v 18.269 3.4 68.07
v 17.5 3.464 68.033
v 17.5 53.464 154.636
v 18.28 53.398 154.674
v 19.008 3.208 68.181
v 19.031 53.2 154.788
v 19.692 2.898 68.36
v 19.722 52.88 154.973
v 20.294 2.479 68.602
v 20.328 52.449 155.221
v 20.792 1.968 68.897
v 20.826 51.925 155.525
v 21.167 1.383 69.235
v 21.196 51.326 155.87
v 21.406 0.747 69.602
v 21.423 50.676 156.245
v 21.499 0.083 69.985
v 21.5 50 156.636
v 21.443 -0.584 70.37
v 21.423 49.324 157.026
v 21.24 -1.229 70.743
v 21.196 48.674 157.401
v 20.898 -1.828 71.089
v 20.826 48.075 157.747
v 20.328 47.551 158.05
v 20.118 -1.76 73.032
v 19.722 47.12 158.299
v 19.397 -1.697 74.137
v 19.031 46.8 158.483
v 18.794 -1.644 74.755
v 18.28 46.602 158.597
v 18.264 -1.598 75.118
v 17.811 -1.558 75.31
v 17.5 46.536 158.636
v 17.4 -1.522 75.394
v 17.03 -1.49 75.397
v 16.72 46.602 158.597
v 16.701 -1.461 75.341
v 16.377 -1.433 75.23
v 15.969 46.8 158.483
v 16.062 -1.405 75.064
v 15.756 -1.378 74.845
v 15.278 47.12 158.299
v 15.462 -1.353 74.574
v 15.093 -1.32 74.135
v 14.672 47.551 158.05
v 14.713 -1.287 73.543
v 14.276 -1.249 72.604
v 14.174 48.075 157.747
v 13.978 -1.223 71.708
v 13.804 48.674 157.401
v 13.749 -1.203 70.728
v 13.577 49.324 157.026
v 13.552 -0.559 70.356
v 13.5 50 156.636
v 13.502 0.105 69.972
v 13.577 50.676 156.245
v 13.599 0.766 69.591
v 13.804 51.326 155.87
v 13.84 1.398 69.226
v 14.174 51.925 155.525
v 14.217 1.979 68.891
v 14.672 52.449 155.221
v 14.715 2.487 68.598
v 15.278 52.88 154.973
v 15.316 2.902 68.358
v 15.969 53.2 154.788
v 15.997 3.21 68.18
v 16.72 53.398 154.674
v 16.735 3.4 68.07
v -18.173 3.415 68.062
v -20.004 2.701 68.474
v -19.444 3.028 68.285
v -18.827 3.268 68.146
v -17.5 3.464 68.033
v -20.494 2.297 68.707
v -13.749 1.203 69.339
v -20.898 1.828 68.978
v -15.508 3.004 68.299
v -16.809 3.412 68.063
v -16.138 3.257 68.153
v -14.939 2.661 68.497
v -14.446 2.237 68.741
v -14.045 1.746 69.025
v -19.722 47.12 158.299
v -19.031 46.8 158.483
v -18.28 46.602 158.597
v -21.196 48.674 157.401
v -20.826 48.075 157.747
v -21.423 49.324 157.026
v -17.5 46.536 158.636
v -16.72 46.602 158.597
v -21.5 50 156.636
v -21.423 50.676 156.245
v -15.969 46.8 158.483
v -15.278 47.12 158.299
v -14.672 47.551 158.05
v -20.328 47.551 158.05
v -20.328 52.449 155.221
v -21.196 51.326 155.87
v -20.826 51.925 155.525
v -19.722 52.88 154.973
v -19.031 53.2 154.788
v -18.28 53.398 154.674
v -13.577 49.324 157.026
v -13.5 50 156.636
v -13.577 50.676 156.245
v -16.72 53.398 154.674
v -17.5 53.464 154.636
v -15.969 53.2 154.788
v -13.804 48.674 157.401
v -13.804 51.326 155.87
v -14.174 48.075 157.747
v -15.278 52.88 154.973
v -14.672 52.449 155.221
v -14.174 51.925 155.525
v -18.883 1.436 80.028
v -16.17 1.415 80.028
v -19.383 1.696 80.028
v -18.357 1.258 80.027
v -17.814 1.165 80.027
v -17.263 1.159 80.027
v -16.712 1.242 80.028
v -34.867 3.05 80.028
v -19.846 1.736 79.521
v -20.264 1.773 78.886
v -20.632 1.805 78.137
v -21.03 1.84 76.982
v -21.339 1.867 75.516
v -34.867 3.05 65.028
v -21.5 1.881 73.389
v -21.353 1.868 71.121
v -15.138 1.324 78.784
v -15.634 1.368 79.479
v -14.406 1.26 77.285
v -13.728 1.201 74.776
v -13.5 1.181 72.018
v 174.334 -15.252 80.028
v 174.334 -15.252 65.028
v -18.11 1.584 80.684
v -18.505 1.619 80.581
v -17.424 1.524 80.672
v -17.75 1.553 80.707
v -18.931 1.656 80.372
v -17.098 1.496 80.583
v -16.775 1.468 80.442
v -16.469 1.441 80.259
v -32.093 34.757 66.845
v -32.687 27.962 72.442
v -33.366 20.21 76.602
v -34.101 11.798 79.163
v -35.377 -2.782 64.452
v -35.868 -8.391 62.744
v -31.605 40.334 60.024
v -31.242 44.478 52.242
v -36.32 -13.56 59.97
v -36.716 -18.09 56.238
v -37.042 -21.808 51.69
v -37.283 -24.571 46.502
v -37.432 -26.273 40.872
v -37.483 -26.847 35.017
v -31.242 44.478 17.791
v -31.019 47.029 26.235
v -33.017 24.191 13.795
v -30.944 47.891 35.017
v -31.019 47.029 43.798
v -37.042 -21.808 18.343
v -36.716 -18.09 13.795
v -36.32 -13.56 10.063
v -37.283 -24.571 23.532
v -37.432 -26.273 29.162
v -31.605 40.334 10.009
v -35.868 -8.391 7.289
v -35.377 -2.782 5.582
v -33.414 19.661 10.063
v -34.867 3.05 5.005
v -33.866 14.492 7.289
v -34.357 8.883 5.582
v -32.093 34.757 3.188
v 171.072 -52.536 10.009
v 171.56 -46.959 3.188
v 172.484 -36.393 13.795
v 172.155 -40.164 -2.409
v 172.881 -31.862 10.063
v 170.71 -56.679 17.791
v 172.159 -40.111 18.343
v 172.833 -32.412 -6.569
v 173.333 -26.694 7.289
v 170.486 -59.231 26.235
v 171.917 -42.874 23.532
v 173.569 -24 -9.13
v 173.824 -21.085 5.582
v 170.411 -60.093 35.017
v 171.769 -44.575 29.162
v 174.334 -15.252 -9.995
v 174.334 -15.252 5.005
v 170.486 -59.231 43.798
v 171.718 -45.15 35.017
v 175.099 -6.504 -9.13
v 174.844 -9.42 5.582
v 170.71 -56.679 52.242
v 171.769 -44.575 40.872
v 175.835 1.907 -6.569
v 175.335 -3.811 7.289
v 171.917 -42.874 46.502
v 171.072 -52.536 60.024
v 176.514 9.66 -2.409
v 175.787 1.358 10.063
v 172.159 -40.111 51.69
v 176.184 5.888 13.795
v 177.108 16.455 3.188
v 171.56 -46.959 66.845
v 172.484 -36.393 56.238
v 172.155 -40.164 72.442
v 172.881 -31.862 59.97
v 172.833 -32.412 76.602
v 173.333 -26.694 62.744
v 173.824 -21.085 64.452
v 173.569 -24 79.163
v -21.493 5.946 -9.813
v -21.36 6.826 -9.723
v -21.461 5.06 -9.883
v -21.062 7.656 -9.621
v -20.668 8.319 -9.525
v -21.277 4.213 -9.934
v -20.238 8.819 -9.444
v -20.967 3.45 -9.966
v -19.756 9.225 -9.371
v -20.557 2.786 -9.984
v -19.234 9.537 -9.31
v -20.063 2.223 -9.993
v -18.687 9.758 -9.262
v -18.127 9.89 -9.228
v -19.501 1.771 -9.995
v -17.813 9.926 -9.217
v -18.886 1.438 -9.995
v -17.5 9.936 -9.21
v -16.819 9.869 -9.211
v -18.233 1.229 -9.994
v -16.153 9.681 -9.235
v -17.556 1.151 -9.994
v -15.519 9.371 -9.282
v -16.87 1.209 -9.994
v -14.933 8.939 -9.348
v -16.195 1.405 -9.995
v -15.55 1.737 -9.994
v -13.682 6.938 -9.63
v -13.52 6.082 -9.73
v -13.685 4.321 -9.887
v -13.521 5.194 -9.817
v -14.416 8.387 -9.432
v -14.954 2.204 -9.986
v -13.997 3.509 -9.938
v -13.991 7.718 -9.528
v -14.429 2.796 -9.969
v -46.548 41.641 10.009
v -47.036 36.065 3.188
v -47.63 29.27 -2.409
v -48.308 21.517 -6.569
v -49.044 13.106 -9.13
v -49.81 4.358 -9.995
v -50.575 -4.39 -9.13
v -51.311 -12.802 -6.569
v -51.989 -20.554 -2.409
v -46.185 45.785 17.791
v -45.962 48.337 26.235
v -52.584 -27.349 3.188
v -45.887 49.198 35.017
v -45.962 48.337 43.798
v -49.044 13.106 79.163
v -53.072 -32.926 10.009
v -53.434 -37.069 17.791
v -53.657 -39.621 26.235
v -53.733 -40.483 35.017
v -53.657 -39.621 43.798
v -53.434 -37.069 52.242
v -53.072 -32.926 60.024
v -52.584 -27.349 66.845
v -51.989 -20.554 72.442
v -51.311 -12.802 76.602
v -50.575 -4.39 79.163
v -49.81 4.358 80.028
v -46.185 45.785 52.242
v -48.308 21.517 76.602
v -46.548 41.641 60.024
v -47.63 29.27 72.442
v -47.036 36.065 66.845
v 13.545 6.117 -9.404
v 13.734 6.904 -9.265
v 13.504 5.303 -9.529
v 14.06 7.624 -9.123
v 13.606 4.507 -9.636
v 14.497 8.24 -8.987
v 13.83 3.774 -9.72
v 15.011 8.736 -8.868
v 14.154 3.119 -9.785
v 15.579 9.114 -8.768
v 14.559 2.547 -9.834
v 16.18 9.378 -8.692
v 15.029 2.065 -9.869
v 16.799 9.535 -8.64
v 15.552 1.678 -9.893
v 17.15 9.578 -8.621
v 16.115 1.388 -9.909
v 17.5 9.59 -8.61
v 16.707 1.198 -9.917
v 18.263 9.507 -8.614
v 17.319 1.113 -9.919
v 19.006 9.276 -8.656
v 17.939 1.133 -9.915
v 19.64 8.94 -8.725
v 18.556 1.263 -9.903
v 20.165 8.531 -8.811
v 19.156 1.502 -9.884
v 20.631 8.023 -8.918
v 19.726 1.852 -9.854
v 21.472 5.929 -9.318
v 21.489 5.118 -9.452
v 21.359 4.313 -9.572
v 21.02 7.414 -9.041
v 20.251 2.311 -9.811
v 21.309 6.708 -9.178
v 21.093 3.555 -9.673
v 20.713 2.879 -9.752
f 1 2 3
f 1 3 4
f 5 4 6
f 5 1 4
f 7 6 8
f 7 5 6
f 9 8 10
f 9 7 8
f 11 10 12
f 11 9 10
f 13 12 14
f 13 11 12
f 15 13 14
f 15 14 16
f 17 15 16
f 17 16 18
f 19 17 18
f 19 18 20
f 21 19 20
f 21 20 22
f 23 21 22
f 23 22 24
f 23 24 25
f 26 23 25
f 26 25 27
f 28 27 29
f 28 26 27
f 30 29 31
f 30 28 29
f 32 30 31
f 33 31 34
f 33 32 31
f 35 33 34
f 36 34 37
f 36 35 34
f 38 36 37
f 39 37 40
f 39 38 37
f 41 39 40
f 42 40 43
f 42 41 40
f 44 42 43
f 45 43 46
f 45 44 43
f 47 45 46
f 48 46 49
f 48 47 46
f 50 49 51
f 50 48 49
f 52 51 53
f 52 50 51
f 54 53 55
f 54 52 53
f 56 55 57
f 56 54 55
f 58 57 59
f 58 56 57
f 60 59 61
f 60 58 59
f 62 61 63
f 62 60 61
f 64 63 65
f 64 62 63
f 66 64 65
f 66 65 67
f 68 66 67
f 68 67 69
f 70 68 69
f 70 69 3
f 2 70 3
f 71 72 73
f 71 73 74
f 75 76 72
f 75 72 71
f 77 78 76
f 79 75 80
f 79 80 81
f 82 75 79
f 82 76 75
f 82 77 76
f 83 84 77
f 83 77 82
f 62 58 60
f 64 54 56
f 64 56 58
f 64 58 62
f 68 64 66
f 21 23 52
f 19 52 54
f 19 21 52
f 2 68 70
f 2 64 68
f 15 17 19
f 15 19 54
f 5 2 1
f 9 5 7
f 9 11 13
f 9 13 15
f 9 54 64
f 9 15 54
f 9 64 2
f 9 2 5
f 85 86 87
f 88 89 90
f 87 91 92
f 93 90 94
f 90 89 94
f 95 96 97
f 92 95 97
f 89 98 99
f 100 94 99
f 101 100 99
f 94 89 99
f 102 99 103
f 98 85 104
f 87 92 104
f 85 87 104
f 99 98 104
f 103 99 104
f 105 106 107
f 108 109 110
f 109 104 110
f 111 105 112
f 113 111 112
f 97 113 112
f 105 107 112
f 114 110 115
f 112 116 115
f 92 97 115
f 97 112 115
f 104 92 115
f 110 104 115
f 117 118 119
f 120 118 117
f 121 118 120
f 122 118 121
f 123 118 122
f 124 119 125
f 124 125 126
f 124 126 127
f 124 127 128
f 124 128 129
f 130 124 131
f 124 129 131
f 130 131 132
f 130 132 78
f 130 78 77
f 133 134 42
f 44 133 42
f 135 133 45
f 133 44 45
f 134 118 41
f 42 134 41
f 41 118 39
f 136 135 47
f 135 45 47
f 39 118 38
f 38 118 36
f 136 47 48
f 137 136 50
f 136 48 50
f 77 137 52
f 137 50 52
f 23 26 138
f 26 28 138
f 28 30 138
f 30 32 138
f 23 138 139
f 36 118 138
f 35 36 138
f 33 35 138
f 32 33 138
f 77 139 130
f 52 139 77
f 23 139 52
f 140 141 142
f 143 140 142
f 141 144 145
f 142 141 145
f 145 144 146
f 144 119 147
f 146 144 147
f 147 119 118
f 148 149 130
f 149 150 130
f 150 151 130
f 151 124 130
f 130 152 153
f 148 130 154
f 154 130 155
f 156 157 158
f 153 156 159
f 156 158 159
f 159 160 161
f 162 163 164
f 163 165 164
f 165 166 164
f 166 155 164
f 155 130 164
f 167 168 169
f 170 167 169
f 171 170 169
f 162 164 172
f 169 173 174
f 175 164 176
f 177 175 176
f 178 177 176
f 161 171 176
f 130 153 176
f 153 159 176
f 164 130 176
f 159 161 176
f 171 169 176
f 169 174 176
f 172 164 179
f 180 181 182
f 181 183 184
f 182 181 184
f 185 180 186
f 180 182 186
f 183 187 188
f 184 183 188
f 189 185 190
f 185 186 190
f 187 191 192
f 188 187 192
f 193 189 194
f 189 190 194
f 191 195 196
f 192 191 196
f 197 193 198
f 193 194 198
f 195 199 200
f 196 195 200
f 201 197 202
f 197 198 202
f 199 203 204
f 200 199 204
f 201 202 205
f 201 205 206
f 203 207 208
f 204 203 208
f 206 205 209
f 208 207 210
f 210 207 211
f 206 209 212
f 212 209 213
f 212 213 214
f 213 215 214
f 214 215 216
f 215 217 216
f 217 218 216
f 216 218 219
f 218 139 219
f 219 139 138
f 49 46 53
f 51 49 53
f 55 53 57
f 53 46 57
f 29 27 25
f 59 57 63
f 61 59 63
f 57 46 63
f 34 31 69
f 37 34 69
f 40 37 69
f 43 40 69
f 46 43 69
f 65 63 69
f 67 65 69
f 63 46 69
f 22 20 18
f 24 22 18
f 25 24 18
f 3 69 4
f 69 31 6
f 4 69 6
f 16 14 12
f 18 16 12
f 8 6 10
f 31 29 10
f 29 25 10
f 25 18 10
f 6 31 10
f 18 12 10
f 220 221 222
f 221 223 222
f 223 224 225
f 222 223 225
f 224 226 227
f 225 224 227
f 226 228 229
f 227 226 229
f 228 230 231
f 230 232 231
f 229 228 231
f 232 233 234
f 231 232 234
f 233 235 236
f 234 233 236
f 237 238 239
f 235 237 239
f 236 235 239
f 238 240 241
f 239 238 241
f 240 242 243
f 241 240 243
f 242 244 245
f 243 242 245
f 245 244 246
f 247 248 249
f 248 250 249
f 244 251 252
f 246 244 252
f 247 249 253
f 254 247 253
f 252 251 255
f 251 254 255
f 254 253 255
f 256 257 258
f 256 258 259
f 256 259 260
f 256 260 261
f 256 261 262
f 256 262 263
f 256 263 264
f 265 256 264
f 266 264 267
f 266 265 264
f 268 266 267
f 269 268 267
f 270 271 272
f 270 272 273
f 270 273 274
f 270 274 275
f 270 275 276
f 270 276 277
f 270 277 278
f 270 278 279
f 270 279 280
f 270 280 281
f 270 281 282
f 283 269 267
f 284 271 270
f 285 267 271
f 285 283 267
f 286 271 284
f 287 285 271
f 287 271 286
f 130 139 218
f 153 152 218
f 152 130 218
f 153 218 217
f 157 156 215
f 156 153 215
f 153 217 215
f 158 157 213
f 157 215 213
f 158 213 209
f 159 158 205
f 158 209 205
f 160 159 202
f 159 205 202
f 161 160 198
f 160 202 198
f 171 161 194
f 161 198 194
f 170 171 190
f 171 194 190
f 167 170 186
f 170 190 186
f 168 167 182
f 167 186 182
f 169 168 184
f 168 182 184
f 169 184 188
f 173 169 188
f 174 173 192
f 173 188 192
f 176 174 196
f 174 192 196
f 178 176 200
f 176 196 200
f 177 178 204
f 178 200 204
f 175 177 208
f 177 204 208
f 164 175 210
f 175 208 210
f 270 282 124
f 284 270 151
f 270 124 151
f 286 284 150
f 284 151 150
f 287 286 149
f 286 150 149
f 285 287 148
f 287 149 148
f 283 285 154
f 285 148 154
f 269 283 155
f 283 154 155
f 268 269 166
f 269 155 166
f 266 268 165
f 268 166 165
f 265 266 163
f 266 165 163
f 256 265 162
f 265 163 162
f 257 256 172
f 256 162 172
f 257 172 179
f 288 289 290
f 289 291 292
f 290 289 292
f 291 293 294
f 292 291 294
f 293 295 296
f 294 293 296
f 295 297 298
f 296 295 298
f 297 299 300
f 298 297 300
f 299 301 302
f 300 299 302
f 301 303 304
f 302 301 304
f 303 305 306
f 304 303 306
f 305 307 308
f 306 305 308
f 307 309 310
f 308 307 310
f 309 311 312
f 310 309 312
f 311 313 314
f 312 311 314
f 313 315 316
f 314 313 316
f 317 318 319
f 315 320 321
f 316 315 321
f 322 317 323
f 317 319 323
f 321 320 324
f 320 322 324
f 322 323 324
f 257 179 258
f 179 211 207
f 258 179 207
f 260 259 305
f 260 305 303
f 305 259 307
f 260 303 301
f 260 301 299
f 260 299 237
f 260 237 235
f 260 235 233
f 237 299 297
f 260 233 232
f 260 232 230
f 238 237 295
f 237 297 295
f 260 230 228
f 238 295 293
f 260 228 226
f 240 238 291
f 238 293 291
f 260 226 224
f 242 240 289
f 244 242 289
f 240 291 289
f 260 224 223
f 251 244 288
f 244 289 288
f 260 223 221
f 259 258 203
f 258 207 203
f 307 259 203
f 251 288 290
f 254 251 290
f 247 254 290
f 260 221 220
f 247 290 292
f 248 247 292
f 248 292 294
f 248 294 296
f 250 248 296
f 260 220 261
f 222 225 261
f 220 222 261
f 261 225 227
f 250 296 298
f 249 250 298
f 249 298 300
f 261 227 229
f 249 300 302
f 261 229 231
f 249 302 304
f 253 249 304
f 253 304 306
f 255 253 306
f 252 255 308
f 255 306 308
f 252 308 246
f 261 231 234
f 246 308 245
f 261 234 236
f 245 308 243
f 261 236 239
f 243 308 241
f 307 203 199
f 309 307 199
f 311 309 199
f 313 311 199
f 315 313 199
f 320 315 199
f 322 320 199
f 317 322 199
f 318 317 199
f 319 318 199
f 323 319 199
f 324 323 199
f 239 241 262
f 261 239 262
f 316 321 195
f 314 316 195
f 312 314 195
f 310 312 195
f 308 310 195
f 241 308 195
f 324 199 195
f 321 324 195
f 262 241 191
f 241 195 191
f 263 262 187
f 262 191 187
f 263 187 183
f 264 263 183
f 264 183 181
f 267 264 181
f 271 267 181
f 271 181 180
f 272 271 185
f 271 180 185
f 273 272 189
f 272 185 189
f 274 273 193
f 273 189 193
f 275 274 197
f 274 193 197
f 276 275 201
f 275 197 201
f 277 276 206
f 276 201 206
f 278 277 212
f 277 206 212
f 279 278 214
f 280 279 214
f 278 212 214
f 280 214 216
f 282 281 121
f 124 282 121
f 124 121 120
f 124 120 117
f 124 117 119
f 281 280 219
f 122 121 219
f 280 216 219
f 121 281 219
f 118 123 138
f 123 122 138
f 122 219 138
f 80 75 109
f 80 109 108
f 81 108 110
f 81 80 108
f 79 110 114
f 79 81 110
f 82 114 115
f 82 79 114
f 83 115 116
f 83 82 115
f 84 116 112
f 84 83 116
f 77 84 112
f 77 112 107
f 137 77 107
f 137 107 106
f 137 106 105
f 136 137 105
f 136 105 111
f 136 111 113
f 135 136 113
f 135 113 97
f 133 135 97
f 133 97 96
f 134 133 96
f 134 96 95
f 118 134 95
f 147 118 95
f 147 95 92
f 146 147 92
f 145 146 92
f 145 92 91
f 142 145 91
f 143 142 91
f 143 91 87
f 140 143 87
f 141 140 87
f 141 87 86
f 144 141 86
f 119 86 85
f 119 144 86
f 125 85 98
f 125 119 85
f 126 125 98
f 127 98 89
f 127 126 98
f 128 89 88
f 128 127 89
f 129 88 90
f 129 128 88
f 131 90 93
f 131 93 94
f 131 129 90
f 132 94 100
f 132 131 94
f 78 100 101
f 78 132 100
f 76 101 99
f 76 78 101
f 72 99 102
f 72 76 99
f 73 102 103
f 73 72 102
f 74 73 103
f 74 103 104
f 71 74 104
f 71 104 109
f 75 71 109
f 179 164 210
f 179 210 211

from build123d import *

# Parameters (mm, degrees)
SKETCH2_R                = 4
BOSS_EXTRUDE1_DEPTH      = 100
BOSS_EXTRUDE1_2_DEPTH    = 100
BOSS_EXTRUDE3_DEPTH      = 50
BOSS_EXTRUDE3_DEPTH_BACK = 175
BOSS_EXTRUDE4_START      = -15
SKETCH5_R                = 45.011707972
BOSS_EXTRUDE4_DEPTH      = 15
SKETCH8_R                = 30.011707972
CUT_EXTRUDE1_DEPTH       = 210


with BuildPart() as part:
    # Sketch2 → Boss-Extrude1 (new body)
    with BuildSketch(Plane(origin=(0, 0, 0), x_dir=(-1, 0, 0), z_dir=(0, 0.499999999999998, -0.8660254037844398))):
        with Locations(Location((-17.5, 0, 0), (0, 0, 90))):
            Circle(SKETCH2_R)
    boss_extrude1 = extrude(amount=BOSS_EXTRUDE1_DEPTH)



with BuildPart() as body_2:
    # Sketch2 → Boss-Extrude1 2 (new body)
    with BuildSketch(Plane(origin=(0, 0, 0), x_dir=(-1, 0, 0), z_dir=(0, 0.499999999999998, -0.8660254037844398))):
        with Locations(Location((17.5, 0, 0), (0, 0, 90))):
            Circle(SKETCH2_R)
    boss_extrude1_2 = extrude(amount=BOSS_EXTRUDE1_2_DEPTH)


with BuildPart() as part_1:
    add(part.part)

    add(body_2.part)  # Boss-Extrude3 merges body 2
    # Sketch4 → Boss-Extrude3 (add, two sides: drawn at the far end of the back side and taken through both)
    with BuildSketch(Plane(origin=(0, 0, 0), x_dir=(0, 0, 1), z_dir=(-0.9961946980917461, 0.08715574274765156, 0)).offset(-BOSS_EXTRUDE3_DEPTH_BACK)):
        with BuildLine():
            Line((80.028265546, 0), (65.028265546, 0))
            ThreePointArc((65.028265546, 0), (23.531574155, -27.727202731), (13.795075351, 21.221482222))
            Line((13.795075351, 21.221482222), (3.188473633, 31.82808394))
            ThreePointArc((3.188473633, 31.82808394), (17.79132267, -41.585395719), (80.028265546, 0))
        make_face()
    extrude(amount=BOSS_EXTRUDE3_DEPTH + BOSS_EXTRUDE3_DEPTH_BACK)

    # Sketch5 → Boss-Extrude4 (add)
    with BuildSketch(Plane(origin=(-49.809734905, 4.357787137, 0), x_dir=(0, 0, 1), z_dir=(-0.9961946980917462, 0.08715574274765156, 0)).offset(BOSS_EXTRUDE4_START)):
        with Locations(Location((35.016557573, 0, 0), (0, 0, 135))):
            Circle(SKETCH5_R)
    extrude(amount=BOSS_EXTRUDE4_DEPTH)

    # Mirror2: Boss-Extrude1, Boss-Extrude1 2 across plane
    add(boss_extrude1.mirror(Plane(origin=(0, 0, 35.016557573), x_dir=(1, 0, 0), z_dir=(0, 0, -1))))
    add(boss_extrude1_2.mirror(Plane(origin=(0, 0, 35.016557573), x_dir=(1, 0, 0), z_dir=(0, 0, -1))))

    # Sketch8 → Cut-Extrude1 (cut)
    with BuildSketch(Plane(origin=(174.334072166, -15.252254981, 0), x_dir=(0, 0, -1), z_dir=(0.9961946980917462, -0.08715574274765156, 0))):
        with Locations((-35.016557573, 0)):
            Circle(SKETCH8_R)
        with BuildLine():
            Line((-80.028265546, 0), (-208.366954173, 0))
            ThreePointArc((-208.366954173, 0), (87.560683384, -122.577240957), (-35.016557573, 173.3503966))
            Line((-35.016557573, 173.3503966), (-35.016557573, 45.011707972))
            ThreePointArc((-35.016557573, 45.011707972), (-3.188473633, -31.82808394), (-80.028265546, 0))
        make_face()
    extrude(amount=-CUT_EXTRUDE1_DEPTH, mode=Mode.SUBTRACT)


solid = part_1.part
